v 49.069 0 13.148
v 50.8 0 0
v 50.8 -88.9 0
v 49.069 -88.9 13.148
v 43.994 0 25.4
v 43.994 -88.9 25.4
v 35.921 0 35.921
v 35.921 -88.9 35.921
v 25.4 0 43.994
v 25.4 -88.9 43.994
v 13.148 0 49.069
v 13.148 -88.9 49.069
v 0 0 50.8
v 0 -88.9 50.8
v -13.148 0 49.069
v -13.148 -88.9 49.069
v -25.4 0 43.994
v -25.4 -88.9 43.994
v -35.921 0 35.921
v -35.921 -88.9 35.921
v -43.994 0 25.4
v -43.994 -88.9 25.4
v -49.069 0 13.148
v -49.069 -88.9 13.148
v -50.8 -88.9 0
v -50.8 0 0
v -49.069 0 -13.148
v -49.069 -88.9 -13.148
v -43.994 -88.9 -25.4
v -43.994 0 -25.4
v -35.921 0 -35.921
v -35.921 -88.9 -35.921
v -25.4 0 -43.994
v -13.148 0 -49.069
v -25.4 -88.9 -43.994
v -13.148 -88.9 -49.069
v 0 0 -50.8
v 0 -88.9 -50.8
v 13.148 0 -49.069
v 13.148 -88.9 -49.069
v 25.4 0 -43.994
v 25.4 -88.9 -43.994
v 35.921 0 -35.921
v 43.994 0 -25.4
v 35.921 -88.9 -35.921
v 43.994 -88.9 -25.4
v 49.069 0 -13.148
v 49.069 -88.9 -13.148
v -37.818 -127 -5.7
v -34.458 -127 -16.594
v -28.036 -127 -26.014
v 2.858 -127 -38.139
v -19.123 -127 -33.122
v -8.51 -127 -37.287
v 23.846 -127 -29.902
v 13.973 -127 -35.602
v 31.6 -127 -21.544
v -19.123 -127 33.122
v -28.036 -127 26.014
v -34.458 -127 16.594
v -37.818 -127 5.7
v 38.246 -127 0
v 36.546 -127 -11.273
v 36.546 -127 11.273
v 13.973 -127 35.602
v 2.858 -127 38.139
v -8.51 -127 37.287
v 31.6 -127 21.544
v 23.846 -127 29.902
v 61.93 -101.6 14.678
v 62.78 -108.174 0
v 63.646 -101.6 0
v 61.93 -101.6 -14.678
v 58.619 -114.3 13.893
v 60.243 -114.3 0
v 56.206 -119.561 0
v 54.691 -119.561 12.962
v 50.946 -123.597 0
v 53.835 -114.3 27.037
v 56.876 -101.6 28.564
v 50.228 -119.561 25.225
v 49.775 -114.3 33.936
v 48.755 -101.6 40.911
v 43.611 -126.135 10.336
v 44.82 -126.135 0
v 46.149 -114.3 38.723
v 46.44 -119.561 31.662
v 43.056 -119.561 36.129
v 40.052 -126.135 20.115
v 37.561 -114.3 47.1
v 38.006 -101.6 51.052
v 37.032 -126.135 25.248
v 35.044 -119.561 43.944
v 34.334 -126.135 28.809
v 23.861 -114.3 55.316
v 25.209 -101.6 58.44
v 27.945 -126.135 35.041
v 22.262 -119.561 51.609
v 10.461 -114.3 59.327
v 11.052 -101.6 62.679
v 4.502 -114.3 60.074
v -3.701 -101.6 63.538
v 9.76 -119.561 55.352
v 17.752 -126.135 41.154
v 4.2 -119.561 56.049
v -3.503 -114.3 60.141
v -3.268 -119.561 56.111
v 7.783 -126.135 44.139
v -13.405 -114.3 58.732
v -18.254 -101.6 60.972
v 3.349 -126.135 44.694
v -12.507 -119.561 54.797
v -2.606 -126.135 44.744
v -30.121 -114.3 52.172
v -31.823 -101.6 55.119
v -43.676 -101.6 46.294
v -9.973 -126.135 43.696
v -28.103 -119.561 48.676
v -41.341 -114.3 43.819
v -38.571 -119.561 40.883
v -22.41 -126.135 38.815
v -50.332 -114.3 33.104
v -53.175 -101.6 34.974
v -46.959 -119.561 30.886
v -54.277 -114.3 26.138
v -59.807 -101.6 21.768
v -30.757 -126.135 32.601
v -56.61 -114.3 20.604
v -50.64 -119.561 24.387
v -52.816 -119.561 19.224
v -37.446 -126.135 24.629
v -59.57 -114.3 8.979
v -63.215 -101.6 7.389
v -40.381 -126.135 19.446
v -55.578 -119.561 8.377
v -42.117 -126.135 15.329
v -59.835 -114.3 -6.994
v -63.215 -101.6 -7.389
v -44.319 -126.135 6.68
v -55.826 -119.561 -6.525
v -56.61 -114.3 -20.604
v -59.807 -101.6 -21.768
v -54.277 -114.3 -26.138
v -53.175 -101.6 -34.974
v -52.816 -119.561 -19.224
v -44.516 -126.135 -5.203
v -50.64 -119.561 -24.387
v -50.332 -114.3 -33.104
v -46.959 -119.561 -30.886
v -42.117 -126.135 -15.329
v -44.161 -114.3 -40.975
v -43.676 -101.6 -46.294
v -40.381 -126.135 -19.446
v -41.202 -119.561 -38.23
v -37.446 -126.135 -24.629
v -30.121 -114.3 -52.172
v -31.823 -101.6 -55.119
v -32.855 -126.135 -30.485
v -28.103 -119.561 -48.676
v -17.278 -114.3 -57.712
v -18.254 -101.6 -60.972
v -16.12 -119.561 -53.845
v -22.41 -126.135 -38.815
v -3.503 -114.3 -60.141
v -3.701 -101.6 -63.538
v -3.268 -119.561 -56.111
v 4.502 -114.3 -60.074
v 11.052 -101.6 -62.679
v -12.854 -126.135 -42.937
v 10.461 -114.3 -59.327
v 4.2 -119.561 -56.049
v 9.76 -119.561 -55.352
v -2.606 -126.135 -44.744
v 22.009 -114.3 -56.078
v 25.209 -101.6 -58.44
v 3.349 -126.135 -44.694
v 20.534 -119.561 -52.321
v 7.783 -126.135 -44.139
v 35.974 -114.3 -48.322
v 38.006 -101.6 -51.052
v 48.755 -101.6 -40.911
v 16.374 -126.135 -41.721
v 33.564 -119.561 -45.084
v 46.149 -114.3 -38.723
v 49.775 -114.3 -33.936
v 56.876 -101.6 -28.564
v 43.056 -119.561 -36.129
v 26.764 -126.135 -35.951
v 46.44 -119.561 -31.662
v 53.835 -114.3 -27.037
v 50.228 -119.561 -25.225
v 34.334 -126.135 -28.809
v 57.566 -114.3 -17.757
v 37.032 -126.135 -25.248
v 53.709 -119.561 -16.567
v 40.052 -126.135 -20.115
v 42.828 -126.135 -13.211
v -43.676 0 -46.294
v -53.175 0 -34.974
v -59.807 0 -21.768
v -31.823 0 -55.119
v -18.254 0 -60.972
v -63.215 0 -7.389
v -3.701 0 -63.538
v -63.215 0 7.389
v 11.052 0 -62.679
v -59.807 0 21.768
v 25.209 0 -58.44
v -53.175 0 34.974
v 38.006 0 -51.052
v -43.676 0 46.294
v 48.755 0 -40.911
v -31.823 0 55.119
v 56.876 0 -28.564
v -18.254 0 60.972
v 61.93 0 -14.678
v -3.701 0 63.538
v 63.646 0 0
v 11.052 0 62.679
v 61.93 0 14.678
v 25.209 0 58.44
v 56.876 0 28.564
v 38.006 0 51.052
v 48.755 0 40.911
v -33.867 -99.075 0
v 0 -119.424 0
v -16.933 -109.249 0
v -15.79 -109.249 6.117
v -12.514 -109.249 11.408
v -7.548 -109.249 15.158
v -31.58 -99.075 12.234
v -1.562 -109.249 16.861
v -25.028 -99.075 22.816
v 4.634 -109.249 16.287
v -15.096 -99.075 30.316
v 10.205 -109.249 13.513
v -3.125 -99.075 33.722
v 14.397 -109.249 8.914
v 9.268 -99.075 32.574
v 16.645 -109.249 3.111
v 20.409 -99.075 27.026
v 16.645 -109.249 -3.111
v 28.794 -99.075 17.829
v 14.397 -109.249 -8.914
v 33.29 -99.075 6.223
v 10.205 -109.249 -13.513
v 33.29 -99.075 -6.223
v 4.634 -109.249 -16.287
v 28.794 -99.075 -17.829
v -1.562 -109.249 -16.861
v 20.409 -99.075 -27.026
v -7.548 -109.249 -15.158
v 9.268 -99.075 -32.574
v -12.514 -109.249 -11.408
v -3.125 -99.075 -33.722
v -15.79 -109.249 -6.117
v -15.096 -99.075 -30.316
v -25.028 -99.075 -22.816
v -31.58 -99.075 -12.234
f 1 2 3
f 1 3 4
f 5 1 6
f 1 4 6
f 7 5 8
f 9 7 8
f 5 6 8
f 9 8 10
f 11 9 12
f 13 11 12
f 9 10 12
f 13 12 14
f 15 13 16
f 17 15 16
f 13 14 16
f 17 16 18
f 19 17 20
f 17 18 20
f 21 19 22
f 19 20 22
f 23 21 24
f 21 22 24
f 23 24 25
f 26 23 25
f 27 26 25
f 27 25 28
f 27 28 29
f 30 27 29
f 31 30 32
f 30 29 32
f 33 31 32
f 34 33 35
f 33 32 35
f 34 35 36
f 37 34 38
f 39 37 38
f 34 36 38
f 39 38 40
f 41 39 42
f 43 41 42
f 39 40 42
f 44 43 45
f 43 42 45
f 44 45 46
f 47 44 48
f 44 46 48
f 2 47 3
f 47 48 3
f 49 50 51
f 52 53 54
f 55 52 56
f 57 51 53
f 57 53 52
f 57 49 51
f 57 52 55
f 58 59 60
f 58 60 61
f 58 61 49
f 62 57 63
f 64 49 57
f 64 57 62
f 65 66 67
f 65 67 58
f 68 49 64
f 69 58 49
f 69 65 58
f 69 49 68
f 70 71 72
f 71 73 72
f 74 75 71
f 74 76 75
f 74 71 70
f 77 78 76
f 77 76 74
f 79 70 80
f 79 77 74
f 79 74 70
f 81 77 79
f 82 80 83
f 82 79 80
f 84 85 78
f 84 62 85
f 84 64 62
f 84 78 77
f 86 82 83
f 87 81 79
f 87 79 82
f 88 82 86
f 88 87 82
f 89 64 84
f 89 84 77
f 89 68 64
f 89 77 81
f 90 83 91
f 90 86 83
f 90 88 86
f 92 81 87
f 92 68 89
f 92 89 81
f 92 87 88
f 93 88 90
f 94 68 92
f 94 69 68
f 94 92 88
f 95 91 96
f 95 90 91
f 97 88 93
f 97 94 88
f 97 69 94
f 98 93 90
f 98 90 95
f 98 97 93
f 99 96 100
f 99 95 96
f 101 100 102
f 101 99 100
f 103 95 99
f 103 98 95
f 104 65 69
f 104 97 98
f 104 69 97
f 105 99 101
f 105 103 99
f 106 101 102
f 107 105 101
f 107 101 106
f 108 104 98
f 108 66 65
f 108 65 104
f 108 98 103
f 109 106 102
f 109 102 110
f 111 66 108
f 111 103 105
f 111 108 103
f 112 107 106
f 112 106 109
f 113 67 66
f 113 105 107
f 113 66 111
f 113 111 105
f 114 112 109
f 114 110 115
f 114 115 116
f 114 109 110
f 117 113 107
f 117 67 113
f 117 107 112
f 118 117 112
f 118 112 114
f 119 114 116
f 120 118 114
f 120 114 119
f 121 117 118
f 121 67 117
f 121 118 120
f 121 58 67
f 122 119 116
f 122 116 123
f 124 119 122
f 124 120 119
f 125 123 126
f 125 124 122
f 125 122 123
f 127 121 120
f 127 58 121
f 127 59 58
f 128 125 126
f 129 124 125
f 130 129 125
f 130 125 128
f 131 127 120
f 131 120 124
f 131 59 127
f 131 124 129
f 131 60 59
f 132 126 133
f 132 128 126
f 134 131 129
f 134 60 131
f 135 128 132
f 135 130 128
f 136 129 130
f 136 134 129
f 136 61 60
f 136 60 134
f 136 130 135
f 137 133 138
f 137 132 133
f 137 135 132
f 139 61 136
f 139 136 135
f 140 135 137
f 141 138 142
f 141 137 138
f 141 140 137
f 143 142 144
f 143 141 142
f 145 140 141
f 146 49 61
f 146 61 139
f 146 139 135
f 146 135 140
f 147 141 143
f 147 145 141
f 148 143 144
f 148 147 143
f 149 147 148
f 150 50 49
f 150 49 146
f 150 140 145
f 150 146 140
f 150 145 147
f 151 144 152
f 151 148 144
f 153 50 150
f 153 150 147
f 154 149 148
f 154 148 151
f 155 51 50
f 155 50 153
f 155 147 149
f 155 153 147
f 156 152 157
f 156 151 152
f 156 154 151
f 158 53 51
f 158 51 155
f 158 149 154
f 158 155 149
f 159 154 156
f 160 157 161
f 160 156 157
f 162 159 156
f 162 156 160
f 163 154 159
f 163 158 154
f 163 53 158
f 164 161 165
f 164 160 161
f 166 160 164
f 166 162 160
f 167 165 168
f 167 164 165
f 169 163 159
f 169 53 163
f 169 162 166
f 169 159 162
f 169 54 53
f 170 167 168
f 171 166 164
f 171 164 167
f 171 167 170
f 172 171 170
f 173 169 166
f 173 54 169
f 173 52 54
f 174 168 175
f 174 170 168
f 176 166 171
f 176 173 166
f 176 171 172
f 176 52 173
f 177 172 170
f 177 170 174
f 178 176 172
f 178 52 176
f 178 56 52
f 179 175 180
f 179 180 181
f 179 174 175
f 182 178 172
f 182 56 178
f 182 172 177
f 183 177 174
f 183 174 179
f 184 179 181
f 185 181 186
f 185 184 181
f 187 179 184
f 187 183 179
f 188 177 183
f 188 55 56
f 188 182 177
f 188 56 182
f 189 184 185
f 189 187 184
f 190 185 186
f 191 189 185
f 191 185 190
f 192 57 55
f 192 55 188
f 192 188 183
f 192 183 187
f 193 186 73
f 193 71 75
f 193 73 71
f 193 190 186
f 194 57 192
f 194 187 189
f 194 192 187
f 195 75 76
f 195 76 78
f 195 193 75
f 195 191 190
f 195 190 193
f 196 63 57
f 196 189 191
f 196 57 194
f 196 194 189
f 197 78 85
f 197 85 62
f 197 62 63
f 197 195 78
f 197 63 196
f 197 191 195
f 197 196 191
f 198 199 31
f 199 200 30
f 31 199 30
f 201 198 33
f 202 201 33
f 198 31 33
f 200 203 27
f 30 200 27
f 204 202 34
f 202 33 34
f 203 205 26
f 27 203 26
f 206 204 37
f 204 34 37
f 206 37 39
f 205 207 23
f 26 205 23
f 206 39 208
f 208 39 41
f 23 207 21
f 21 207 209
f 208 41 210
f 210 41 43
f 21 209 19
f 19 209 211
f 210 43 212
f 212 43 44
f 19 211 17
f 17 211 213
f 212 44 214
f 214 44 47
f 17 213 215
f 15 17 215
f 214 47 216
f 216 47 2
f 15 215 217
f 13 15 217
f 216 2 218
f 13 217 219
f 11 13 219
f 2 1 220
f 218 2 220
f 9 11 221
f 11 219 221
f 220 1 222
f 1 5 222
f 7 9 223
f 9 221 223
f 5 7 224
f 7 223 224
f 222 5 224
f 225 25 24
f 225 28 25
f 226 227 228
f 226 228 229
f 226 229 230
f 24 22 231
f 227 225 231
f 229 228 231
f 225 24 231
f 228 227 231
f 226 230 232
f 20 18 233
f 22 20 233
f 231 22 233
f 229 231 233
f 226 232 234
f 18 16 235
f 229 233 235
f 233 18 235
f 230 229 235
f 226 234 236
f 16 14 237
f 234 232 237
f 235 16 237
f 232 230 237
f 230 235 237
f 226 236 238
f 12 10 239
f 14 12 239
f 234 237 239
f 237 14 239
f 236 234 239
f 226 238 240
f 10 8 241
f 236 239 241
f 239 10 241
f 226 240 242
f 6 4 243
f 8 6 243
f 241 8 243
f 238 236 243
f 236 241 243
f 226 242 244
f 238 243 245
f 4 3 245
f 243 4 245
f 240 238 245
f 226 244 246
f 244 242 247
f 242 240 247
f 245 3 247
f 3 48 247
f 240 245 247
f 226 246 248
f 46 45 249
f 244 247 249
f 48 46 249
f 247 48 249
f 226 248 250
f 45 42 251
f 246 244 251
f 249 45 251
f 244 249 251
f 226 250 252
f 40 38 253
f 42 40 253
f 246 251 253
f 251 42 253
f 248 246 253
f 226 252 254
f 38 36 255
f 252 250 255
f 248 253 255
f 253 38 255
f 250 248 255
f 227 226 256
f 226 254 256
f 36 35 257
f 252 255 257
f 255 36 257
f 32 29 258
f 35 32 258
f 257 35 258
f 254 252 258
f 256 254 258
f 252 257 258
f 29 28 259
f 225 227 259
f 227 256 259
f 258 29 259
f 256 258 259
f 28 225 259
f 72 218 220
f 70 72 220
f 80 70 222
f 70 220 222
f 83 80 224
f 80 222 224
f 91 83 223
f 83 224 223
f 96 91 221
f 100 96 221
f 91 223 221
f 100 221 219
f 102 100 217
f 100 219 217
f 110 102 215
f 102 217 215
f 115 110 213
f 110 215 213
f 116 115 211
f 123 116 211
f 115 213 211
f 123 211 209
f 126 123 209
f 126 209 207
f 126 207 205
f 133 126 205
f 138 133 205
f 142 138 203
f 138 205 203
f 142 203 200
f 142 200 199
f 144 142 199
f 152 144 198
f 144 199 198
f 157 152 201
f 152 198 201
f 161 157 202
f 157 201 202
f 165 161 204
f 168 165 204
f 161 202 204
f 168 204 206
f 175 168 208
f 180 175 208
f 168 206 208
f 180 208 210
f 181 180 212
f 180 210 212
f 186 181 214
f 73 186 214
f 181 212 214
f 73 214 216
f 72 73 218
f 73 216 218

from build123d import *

# Parameters (mm, degrees)
F0_R     = 63.6455484586
F1_DEPTH = 127
F2_R     = 25.4
F4_D     = 101.6
F4_DEPTH = 88.9
F4_TIP   = 30.5237194466


with BuildPart() as f1:
    # F0 (on Front) → F1 (new body)
    with BuildSketch(Plane.XZ):
        Circle(F0_R)
    extrude(amount=F1_DEPTH)

    # F2
    f2_edges = [f1.edges().sort_by_distance(p)[0] for p in [
        (-63.645548, -127, 0),
    ]]
    fillet(f2_edges, radius=F2_R)

    # F4
    with Locations(Plane(origin=(0, 0, 0), x_dir=(-1, 0, 0), z_dir=(0, 1, 0))):
        with Locations((0, 0)):
            Hole(F4_D / 2, depth=F4_DEPTH)
            with Locations((0, 0, -(F4_DEPTH + F4_TIP / 2))):  # 118° drill point
                Cone(0, F4_D / 2, F4_TIP, mode=Mode.SUBTRACT)


solid = f1.part
